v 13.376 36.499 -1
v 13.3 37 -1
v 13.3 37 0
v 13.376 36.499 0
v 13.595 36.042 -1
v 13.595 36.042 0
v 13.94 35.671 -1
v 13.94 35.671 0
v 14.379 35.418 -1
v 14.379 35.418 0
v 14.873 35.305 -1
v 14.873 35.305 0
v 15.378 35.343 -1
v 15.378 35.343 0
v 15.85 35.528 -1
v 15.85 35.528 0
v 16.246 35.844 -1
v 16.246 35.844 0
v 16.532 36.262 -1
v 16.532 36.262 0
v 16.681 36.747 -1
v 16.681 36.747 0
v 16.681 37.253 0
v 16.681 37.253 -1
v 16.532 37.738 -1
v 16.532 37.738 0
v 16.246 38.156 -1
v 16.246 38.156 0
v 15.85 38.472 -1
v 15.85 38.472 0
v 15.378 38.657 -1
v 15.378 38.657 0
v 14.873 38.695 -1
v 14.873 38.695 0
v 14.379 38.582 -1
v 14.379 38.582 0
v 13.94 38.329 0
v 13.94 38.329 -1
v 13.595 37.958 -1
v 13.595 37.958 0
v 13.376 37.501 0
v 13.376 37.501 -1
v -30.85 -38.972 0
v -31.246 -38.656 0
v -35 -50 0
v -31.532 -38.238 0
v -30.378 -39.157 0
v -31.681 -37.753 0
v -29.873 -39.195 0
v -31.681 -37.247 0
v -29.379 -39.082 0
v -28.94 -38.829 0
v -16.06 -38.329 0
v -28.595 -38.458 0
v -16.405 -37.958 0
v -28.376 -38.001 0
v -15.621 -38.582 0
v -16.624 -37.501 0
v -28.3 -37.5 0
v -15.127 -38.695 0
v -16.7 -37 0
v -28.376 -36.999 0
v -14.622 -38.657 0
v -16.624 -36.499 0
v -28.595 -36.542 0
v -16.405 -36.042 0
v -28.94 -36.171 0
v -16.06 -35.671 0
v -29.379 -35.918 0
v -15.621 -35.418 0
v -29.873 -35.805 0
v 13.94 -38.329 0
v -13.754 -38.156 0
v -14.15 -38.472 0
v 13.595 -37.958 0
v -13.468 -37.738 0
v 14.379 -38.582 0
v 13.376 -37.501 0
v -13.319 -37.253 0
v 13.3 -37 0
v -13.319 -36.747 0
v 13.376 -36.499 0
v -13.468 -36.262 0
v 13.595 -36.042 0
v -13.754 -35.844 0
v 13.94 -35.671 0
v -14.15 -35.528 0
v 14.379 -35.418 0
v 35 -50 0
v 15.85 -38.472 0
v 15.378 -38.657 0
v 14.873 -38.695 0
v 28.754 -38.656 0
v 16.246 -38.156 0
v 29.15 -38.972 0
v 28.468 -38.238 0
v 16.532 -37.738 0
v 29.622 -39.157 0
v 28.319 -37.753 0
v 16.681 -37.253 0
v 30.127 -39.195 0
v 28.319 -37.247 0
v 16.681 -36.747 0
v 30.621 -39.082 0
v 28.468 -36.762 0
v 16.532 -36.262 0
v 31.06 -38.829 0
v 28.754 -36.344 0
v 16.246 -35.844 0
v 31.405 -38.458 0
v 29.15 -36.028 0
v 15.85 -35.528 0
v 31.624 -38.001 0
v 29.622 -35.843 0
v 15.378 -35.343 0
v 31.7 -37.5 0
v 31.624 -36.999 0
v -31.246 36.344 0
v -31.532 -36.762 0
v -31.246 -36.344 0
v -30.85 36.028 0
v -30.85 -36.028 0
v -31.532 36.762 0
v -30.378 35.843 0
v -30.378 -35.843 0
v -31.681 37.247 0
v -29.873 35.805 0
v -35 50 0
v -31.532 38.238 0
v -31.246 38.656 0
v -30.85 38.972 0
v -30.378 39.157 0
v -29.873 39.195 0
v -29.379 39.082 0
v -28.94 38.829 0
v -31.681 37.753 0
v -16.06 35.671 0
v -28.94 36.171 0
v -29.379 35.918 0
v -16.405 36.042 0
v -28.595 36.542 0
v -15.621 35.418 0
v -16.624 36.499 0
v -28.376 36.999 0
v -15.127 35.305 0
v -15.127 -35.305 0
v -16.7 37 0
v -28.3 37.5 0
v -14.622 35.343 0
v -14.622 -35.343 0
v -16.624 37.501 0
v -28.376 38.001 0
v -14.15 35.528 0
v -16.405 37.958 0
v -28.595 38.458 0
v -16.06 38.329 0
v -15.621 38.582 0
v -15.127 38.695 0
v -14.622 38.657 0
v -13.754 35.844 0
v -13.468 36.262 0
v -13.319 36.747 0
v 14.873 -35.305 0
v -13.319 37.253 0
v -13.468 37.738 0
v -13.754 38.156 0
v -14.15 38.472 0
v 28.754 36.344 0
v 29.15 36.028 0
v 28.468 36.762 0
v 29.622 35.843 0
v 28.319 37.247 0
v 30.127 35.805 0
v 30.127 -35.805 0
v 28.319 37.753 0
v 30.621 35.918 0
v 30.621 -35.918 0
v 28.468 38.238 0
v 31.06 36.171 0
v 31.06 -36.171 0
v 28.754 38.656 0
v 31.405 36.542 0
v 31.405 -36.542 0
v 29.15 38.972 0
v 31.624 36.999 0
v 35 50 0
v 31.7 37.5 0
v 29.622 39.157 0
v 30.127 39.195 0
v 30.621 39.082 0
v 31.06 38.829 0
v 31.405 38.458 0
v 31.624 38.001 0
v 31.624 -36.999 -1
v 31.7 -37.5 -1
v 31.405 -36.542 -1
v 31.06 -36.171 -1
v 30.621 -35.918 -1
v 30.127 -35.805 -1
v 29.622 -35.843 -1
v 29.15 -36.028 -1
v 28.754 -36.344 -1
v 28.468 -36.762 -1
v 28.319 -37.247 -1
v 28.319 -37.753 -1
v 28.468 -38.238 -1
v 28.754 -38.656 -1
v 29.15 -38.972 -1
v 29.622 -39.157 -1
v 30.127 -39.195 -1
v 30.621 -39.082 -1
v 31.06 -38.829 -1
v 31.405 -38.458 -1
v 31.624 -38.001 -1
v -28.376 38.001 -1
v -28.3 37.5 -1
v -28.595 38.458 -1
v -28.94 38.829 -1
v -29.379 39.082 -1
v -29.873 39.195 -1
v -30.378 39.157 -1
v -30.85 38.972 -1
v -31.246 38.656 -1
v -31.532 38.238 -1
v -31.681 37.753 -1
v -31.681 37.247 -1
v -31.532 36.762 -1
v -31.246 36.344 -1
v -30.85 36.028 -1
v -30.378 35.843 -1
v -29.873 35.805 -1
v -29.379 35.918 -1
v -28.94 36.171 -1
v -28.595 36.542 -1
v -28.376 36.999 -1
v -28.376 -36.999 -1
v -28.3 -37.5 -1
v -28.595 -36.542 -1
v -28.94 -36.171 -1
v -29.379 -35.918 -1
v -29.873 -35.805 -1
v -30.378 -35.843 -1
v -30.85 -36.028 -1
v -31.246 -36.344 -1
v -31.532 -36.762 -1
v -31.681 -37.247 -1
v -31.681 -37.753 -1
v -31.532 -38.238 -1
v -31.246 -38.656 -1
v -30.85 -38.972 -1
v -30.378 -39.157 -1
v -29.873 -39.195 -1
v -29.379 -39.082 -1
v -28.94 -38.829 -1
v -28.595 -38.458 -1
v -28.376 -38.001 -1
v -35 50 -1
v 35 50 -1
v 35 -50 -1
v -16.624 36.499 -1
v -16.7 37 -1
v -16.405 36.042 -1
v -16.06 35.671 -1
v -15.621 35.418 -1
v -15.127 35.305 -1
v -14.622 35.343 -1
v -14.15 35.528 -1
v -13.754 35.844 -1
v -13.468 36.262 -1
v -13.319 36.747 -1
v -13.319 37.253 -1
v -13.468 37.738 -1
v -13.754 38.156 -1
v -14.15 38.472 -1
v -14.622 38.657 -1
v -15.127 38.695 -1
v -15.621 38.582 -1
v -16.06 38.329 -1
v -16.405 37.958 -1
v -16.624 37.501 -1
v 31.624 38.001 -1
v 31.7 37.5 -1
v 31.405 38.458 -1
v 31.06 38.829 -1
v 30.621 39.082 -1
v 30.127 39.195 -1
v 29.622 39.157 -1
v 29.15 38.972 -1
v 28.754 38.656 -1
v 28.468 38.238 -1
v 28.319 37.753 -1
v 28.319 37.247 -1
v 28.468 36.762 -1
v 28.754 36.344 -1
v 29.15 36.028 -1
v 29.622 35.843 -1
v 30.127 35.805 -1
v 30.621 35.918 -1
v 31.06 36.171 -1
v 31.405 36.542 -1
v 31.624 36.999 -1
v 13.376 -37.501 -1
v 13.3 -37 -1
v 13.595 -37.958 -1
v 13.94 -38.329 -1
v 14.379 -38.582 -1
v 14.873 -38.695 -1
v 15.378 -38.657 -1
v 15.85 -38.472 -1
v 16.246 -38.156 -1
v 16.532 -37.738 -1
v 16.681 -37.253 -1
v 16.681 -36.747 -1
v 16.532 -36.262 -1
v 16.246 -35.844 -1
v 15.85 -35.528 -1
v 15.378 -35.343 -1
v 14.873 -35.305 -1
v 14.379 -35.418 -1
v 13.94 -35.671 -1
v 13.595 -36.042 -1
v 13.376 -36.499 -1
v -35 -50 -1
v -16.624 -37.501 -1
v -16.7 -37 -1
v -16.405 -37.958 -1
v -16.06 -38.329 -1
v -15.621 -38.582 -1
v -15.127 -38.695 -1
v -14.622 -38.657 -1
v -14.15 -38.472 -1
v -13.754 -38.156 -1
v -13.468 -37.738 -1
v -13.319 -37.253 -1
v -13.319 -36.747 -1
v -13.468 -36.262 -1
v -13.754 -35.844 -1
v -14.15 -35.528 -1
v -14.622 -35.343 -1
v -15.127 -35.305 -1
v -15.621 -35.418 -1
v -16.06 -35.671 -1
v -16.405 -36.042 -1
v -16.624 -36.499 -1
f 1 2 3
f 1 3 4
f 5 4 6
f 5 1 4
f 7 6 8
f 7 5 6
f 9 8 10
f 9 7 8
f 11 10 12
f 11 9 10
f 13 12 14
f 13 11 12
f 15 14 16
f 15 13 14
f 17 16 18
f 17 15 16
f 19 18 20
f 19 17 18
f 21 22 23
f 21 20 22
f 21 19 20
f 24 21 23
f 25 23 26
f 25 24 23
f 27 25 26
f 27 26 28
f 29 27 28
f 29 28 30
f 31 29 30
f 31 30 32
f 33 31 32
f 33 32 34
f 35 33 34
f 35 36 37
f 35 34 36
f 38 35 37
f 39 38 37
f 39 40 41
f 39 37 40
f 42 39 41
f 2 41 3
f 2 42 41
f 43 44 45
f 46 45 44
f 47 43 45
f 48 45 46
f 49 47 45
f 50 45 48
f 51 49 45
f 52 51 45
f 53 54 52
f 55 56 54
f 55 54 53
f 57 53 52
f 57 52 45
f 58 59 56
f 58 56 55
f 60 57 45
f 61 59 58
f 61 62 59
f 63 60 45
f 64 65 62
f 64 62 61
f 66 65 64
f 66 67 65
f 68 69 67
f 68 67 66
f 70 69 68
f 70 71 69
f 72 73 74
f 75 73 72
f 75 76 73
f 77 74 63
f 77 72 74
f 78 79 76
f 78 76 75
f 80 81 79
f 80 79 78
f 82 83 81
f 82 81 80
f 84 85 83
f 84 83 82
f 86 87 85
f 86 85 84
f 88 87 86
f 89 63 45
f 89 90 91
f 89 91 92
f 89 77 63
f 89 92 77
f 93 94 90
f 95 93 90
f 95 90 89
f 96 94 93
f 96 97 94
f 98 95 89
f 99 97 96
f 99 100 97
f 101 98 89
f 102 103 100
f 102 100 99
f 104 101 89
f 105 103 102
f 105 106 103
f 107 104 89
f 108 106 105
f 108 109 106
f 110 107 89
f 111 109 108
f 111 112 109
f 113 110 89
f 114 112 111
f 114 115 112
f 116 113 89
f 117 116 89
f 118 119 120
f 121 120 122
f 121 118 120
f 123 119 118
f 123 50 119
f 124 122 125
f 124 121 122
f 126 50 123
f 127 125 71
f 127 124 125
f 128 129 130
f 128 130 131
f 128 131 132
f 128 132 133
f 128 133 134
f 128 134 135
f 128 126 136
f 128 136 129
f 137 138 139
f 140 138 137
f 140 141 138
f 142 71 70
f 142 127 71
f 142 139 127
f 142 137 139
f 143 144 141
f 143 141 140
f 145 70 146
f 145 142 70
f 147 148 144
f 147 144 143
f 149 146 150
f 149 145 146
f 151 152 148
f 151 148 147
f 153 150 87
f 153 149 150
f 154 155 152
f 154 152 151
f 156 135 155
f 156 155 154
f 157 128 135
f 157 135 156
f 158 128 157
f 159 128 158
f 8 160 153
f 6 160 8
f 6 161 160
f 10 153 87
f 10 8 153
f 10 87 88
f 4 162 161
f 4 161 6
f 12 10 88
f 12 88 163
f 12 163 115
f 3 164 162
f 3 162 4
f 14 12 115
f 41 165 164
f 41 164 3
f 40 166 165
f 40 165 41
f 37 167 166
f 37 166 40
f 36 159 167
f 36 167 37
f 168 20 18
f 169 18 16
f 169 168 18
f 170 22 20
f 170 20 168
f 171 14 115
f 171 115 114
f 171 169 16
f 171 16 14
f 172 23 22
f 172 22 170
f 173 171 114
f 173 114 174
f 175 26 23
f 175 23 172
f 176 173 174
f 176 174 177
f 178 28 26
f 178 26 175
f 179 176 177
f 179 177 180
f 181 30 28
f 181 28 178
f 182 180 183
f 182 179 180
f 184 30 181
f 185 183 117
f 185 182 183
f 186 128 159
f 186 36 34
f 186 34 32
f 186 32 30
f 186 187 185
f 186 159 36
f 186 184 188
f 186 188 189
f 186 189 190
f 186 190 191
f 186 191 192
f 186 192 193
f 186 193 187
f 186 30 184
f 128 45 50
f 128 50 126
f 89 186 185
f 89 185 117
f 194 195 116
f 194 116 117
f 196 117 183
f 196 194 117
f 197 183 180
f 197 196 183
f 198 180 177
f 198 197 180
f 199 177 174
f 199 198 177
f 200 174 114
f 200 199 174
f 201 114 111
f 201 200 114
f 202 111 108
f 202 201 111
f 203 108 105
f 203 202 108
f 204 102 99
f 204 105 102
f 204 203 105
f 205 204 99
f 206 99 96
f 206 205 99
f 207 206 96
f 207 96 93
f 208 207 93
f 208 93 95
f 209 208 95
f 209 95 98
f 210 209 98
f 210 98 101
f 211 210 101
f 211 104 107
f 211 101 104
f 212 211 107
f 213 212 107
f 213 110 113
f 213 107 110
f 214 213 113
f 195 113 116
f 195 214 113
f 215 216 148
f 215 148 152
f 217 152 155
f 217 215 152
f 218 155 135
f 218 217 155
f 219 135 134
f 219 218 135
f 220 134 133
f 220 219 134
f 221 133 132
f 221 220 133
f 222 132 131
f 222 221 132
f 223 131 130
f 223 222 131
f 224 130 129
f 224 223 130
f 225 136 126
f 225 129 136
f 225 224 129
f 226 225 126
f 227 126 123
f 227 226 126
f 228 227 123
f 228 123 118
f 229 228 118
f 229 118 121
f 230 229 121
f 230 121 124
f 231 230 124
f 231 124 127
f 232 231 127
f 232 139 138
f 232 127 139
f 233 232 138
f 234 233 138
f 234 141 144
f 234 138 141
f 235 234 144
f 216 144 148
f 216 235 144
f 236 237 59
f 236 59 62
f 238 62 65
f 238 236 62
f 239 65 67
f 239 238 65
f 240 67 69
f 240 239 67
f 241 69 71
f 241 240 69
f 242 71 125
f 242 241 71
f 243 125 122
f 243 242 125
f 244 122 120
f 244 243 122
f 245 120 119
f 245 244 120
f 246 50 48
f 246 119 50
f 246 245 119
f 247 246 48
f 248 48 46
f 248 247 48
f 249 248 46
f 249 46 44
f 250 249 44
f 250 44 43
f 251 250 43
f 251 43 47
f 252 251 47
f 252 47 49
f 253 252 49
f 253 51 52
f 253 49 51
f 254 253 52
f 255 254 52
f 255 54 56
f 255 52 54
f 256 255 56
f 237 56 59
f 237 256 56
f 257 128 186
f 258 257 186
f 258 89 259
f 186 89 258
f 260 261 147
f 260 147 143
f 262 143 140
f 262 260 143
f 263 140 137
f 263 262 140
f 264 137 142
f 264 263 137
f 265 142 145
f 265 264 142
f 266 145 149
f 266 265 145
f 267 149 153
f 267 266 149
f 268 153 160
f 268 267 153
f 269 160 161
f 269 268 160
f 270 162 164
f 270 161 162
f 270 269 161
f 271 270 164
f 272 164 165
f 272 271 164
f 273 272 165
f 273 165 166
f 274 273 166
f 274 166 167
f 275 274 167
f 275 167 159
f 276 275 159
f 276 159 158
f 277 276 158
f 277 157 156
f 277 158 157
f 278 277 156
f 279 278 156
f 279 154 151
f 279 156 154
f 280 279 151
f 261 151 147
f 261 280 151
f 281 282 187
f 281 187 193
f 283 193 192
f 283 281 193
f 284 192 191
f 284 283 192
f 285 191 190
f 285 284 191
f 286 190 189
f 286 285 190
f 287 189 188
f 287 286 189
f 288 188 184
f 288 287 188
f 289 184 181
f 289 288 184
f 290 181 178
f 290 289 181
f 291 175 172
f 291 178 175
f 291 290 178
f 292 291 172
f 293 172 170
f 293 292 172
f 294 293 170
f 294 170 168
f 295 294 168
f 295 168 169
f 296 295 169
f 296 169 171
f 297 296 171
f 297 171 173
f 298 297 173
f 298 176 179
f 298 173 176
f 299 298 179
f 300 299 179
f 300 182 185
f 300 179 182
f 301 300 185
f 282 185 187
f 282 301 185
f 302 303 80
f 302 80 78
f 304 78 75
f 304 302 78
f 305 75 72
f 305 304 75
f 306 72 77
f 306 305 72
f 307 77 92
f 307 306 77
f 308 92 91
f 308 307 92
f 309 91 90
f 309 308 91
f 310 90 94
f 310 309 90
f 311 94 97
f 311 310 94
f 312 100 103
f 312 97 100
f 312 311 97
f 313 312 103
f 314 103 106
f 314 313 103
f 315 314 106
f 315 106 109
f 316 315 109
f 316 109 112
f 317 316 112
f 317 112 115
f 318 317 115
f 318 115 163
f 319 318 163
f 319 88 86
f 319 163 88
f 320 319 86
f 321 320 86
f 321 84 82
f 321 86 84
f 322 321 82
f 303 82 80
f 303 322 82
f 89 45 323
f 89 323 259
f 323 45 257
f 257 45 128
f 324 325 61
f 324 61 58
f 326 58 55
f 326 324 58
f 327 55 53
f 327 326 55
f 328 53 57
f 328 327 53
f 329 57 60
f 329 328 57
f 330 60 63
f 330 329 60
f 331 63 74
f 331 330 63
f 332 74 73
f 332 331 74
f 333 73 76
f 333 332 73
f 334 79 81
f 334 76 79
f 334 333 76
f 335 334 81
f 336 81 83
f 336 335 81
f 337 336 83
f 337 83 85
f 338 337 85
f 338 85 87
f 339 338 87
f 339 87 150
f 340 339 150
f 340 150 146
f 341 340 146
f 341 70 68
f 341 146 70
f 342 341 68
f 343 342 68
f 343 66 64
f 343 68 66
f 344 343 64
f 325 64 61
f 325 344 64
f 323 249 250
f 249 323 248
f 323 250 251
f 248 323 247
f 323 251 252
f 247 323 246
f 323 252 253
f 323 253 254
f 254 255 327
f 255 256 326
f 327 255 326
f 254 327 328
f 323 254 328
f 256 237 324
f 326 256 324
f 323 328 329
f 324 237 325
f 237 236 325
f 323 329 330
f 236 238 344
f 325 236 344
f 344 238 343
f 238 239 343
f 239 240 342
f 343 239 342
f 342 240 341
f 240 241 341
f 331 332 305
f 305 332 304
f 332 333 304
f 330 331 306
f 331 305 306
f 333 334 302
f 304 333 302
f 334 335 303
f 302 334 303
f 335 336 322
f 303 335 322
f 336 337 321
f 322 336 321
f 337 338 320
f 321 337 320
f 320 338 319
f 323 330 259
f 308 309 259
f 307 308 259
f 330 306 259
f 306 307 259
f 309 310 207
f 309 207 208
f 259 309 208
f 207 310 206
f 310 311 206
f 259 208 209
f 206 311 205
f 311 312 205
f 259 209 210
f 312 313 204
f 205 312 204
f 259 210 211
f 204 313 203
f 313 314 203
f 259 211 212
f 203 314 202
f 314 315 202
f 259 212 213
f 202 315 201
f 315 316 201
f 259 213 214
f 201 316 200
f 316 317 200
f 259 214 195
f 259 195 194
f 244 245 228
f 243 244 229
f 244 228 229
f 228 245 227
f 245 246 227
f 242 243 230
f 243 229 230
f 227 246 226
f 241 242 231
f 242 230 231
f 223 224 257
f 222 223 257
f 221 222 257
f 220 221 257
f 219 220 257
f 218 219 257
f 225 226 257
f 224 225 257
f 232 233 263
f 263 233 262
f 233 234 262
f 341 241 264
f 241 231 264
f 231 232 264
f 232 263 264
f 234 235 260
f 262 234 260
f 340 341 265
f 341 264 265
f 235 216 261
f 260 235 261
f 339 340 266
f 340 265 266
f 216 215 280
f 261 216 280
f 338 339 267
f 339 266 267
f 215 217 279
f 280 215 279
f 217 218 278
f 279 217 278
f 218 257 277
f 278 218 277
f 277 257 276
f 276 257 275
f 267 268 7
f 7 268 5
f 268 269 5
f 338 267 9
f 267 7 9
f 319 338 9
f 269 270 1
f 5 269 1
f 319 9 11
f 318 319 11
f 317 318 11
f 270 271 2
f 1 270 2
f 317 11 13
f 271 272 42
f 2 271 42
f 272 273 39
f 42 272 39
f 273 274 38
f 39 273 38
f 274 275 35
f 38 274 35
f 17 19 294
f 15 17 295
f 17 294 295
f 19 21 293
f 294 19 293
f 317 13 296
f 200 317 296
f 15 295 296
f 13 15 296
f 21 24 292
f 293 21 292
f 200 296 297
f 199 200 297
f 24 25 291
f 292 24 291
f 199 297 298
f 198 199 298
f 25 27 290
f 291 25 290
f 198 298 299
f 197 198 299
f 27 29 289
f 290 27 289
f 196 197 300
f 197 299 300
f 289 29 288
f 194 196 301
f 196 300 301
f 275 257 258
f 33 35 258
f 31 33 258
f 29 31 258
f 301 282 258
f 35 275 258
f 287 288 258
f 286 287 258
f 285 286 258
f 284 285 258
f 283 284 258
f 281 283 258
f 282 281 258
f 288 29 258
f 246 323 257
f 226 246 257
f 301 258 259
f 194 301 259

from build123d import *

# Parameters (mm, degrees)
SKETCH1_W                   = 70
SKETCH1_H                   = 100
BOSS_EXTRUDE1_DEPTH         = 1
CUT_EXTRUDE1_DEPTH          = 62.040969848
CUT_EXTRUDE1_DEPTH_BACK     = 62.040969848
SKETCH2_R                   = 1.7
LO_M3_BAT_DRIVER_DEPTH      = 62.040969848
LO_M3_BAT_DRIVER_DEPTH_BACK = 62.040969848
SKETCH3_R                   = 1.7


with BuildPart() as part:
    # Sketch1 → Boss-Extrude1 (new body)
    with BuildSketch(Plane.XY):
        Rectangle(SKETCH1_W, SKETCH1_H)
    extrude(amount=-BOSS_EXTRUDE1_DEPTH)

    # Sketch2 → Cut-Extrude1 (cut, two sides: drawn at the far end of the back side and taken through both)
    with BuildSketch(Plane.XY.offset(-CUT_EXTRUDE1_DEPTH_BACK)):
        with Locations((-30, -37.5)):
            Circle(SKETCH2_R)
        with Locations((-30, 37.5)):
            Circle(SKETCH2_R)
        with Locations((30, -37.5)):
            Circle(SKETCH2_R)
        with Locations((30, 37.5)):
            Circle(SKETCH2_R)
    extrude(amount=CUT_EXTRUDE1_DEPTH + CUT_EXTRUDE1_DEPTH_BACK, mode=Mode.SUBTRACT)

    # Sketch3 → Lo_M3_bat_driver (cut, two sides: drawn at the far end of the back side and taken through both)
    with BuildSketch(Plane.XY.offset(-LO_M3_BAT_DRIVER_DEPTH_BACK)):
        with Locations(Location((-15, -37, 0), (0, 0, 180))):
            Circle(SKETCH3_R)
        with Locations(Location((-15, 37, 0), (0, 0, 180))):
            Circle(SKETCH3_R)
        with Locations(Location((15, -37, 0), (0, 0, 180))):
            Circle(SKETCH3_R)
        with Locations(Location((15, 37, 0), (0, 0, 180))):
            Circle(SKETCH3_R)
    extrude(amount=LO_M3_BAT_DRIVER_DEPTH + LO_M3_BAT_DRIVER_DEPTH_BACK, mode=Mode.SUBTRACT)


solid = part.part
